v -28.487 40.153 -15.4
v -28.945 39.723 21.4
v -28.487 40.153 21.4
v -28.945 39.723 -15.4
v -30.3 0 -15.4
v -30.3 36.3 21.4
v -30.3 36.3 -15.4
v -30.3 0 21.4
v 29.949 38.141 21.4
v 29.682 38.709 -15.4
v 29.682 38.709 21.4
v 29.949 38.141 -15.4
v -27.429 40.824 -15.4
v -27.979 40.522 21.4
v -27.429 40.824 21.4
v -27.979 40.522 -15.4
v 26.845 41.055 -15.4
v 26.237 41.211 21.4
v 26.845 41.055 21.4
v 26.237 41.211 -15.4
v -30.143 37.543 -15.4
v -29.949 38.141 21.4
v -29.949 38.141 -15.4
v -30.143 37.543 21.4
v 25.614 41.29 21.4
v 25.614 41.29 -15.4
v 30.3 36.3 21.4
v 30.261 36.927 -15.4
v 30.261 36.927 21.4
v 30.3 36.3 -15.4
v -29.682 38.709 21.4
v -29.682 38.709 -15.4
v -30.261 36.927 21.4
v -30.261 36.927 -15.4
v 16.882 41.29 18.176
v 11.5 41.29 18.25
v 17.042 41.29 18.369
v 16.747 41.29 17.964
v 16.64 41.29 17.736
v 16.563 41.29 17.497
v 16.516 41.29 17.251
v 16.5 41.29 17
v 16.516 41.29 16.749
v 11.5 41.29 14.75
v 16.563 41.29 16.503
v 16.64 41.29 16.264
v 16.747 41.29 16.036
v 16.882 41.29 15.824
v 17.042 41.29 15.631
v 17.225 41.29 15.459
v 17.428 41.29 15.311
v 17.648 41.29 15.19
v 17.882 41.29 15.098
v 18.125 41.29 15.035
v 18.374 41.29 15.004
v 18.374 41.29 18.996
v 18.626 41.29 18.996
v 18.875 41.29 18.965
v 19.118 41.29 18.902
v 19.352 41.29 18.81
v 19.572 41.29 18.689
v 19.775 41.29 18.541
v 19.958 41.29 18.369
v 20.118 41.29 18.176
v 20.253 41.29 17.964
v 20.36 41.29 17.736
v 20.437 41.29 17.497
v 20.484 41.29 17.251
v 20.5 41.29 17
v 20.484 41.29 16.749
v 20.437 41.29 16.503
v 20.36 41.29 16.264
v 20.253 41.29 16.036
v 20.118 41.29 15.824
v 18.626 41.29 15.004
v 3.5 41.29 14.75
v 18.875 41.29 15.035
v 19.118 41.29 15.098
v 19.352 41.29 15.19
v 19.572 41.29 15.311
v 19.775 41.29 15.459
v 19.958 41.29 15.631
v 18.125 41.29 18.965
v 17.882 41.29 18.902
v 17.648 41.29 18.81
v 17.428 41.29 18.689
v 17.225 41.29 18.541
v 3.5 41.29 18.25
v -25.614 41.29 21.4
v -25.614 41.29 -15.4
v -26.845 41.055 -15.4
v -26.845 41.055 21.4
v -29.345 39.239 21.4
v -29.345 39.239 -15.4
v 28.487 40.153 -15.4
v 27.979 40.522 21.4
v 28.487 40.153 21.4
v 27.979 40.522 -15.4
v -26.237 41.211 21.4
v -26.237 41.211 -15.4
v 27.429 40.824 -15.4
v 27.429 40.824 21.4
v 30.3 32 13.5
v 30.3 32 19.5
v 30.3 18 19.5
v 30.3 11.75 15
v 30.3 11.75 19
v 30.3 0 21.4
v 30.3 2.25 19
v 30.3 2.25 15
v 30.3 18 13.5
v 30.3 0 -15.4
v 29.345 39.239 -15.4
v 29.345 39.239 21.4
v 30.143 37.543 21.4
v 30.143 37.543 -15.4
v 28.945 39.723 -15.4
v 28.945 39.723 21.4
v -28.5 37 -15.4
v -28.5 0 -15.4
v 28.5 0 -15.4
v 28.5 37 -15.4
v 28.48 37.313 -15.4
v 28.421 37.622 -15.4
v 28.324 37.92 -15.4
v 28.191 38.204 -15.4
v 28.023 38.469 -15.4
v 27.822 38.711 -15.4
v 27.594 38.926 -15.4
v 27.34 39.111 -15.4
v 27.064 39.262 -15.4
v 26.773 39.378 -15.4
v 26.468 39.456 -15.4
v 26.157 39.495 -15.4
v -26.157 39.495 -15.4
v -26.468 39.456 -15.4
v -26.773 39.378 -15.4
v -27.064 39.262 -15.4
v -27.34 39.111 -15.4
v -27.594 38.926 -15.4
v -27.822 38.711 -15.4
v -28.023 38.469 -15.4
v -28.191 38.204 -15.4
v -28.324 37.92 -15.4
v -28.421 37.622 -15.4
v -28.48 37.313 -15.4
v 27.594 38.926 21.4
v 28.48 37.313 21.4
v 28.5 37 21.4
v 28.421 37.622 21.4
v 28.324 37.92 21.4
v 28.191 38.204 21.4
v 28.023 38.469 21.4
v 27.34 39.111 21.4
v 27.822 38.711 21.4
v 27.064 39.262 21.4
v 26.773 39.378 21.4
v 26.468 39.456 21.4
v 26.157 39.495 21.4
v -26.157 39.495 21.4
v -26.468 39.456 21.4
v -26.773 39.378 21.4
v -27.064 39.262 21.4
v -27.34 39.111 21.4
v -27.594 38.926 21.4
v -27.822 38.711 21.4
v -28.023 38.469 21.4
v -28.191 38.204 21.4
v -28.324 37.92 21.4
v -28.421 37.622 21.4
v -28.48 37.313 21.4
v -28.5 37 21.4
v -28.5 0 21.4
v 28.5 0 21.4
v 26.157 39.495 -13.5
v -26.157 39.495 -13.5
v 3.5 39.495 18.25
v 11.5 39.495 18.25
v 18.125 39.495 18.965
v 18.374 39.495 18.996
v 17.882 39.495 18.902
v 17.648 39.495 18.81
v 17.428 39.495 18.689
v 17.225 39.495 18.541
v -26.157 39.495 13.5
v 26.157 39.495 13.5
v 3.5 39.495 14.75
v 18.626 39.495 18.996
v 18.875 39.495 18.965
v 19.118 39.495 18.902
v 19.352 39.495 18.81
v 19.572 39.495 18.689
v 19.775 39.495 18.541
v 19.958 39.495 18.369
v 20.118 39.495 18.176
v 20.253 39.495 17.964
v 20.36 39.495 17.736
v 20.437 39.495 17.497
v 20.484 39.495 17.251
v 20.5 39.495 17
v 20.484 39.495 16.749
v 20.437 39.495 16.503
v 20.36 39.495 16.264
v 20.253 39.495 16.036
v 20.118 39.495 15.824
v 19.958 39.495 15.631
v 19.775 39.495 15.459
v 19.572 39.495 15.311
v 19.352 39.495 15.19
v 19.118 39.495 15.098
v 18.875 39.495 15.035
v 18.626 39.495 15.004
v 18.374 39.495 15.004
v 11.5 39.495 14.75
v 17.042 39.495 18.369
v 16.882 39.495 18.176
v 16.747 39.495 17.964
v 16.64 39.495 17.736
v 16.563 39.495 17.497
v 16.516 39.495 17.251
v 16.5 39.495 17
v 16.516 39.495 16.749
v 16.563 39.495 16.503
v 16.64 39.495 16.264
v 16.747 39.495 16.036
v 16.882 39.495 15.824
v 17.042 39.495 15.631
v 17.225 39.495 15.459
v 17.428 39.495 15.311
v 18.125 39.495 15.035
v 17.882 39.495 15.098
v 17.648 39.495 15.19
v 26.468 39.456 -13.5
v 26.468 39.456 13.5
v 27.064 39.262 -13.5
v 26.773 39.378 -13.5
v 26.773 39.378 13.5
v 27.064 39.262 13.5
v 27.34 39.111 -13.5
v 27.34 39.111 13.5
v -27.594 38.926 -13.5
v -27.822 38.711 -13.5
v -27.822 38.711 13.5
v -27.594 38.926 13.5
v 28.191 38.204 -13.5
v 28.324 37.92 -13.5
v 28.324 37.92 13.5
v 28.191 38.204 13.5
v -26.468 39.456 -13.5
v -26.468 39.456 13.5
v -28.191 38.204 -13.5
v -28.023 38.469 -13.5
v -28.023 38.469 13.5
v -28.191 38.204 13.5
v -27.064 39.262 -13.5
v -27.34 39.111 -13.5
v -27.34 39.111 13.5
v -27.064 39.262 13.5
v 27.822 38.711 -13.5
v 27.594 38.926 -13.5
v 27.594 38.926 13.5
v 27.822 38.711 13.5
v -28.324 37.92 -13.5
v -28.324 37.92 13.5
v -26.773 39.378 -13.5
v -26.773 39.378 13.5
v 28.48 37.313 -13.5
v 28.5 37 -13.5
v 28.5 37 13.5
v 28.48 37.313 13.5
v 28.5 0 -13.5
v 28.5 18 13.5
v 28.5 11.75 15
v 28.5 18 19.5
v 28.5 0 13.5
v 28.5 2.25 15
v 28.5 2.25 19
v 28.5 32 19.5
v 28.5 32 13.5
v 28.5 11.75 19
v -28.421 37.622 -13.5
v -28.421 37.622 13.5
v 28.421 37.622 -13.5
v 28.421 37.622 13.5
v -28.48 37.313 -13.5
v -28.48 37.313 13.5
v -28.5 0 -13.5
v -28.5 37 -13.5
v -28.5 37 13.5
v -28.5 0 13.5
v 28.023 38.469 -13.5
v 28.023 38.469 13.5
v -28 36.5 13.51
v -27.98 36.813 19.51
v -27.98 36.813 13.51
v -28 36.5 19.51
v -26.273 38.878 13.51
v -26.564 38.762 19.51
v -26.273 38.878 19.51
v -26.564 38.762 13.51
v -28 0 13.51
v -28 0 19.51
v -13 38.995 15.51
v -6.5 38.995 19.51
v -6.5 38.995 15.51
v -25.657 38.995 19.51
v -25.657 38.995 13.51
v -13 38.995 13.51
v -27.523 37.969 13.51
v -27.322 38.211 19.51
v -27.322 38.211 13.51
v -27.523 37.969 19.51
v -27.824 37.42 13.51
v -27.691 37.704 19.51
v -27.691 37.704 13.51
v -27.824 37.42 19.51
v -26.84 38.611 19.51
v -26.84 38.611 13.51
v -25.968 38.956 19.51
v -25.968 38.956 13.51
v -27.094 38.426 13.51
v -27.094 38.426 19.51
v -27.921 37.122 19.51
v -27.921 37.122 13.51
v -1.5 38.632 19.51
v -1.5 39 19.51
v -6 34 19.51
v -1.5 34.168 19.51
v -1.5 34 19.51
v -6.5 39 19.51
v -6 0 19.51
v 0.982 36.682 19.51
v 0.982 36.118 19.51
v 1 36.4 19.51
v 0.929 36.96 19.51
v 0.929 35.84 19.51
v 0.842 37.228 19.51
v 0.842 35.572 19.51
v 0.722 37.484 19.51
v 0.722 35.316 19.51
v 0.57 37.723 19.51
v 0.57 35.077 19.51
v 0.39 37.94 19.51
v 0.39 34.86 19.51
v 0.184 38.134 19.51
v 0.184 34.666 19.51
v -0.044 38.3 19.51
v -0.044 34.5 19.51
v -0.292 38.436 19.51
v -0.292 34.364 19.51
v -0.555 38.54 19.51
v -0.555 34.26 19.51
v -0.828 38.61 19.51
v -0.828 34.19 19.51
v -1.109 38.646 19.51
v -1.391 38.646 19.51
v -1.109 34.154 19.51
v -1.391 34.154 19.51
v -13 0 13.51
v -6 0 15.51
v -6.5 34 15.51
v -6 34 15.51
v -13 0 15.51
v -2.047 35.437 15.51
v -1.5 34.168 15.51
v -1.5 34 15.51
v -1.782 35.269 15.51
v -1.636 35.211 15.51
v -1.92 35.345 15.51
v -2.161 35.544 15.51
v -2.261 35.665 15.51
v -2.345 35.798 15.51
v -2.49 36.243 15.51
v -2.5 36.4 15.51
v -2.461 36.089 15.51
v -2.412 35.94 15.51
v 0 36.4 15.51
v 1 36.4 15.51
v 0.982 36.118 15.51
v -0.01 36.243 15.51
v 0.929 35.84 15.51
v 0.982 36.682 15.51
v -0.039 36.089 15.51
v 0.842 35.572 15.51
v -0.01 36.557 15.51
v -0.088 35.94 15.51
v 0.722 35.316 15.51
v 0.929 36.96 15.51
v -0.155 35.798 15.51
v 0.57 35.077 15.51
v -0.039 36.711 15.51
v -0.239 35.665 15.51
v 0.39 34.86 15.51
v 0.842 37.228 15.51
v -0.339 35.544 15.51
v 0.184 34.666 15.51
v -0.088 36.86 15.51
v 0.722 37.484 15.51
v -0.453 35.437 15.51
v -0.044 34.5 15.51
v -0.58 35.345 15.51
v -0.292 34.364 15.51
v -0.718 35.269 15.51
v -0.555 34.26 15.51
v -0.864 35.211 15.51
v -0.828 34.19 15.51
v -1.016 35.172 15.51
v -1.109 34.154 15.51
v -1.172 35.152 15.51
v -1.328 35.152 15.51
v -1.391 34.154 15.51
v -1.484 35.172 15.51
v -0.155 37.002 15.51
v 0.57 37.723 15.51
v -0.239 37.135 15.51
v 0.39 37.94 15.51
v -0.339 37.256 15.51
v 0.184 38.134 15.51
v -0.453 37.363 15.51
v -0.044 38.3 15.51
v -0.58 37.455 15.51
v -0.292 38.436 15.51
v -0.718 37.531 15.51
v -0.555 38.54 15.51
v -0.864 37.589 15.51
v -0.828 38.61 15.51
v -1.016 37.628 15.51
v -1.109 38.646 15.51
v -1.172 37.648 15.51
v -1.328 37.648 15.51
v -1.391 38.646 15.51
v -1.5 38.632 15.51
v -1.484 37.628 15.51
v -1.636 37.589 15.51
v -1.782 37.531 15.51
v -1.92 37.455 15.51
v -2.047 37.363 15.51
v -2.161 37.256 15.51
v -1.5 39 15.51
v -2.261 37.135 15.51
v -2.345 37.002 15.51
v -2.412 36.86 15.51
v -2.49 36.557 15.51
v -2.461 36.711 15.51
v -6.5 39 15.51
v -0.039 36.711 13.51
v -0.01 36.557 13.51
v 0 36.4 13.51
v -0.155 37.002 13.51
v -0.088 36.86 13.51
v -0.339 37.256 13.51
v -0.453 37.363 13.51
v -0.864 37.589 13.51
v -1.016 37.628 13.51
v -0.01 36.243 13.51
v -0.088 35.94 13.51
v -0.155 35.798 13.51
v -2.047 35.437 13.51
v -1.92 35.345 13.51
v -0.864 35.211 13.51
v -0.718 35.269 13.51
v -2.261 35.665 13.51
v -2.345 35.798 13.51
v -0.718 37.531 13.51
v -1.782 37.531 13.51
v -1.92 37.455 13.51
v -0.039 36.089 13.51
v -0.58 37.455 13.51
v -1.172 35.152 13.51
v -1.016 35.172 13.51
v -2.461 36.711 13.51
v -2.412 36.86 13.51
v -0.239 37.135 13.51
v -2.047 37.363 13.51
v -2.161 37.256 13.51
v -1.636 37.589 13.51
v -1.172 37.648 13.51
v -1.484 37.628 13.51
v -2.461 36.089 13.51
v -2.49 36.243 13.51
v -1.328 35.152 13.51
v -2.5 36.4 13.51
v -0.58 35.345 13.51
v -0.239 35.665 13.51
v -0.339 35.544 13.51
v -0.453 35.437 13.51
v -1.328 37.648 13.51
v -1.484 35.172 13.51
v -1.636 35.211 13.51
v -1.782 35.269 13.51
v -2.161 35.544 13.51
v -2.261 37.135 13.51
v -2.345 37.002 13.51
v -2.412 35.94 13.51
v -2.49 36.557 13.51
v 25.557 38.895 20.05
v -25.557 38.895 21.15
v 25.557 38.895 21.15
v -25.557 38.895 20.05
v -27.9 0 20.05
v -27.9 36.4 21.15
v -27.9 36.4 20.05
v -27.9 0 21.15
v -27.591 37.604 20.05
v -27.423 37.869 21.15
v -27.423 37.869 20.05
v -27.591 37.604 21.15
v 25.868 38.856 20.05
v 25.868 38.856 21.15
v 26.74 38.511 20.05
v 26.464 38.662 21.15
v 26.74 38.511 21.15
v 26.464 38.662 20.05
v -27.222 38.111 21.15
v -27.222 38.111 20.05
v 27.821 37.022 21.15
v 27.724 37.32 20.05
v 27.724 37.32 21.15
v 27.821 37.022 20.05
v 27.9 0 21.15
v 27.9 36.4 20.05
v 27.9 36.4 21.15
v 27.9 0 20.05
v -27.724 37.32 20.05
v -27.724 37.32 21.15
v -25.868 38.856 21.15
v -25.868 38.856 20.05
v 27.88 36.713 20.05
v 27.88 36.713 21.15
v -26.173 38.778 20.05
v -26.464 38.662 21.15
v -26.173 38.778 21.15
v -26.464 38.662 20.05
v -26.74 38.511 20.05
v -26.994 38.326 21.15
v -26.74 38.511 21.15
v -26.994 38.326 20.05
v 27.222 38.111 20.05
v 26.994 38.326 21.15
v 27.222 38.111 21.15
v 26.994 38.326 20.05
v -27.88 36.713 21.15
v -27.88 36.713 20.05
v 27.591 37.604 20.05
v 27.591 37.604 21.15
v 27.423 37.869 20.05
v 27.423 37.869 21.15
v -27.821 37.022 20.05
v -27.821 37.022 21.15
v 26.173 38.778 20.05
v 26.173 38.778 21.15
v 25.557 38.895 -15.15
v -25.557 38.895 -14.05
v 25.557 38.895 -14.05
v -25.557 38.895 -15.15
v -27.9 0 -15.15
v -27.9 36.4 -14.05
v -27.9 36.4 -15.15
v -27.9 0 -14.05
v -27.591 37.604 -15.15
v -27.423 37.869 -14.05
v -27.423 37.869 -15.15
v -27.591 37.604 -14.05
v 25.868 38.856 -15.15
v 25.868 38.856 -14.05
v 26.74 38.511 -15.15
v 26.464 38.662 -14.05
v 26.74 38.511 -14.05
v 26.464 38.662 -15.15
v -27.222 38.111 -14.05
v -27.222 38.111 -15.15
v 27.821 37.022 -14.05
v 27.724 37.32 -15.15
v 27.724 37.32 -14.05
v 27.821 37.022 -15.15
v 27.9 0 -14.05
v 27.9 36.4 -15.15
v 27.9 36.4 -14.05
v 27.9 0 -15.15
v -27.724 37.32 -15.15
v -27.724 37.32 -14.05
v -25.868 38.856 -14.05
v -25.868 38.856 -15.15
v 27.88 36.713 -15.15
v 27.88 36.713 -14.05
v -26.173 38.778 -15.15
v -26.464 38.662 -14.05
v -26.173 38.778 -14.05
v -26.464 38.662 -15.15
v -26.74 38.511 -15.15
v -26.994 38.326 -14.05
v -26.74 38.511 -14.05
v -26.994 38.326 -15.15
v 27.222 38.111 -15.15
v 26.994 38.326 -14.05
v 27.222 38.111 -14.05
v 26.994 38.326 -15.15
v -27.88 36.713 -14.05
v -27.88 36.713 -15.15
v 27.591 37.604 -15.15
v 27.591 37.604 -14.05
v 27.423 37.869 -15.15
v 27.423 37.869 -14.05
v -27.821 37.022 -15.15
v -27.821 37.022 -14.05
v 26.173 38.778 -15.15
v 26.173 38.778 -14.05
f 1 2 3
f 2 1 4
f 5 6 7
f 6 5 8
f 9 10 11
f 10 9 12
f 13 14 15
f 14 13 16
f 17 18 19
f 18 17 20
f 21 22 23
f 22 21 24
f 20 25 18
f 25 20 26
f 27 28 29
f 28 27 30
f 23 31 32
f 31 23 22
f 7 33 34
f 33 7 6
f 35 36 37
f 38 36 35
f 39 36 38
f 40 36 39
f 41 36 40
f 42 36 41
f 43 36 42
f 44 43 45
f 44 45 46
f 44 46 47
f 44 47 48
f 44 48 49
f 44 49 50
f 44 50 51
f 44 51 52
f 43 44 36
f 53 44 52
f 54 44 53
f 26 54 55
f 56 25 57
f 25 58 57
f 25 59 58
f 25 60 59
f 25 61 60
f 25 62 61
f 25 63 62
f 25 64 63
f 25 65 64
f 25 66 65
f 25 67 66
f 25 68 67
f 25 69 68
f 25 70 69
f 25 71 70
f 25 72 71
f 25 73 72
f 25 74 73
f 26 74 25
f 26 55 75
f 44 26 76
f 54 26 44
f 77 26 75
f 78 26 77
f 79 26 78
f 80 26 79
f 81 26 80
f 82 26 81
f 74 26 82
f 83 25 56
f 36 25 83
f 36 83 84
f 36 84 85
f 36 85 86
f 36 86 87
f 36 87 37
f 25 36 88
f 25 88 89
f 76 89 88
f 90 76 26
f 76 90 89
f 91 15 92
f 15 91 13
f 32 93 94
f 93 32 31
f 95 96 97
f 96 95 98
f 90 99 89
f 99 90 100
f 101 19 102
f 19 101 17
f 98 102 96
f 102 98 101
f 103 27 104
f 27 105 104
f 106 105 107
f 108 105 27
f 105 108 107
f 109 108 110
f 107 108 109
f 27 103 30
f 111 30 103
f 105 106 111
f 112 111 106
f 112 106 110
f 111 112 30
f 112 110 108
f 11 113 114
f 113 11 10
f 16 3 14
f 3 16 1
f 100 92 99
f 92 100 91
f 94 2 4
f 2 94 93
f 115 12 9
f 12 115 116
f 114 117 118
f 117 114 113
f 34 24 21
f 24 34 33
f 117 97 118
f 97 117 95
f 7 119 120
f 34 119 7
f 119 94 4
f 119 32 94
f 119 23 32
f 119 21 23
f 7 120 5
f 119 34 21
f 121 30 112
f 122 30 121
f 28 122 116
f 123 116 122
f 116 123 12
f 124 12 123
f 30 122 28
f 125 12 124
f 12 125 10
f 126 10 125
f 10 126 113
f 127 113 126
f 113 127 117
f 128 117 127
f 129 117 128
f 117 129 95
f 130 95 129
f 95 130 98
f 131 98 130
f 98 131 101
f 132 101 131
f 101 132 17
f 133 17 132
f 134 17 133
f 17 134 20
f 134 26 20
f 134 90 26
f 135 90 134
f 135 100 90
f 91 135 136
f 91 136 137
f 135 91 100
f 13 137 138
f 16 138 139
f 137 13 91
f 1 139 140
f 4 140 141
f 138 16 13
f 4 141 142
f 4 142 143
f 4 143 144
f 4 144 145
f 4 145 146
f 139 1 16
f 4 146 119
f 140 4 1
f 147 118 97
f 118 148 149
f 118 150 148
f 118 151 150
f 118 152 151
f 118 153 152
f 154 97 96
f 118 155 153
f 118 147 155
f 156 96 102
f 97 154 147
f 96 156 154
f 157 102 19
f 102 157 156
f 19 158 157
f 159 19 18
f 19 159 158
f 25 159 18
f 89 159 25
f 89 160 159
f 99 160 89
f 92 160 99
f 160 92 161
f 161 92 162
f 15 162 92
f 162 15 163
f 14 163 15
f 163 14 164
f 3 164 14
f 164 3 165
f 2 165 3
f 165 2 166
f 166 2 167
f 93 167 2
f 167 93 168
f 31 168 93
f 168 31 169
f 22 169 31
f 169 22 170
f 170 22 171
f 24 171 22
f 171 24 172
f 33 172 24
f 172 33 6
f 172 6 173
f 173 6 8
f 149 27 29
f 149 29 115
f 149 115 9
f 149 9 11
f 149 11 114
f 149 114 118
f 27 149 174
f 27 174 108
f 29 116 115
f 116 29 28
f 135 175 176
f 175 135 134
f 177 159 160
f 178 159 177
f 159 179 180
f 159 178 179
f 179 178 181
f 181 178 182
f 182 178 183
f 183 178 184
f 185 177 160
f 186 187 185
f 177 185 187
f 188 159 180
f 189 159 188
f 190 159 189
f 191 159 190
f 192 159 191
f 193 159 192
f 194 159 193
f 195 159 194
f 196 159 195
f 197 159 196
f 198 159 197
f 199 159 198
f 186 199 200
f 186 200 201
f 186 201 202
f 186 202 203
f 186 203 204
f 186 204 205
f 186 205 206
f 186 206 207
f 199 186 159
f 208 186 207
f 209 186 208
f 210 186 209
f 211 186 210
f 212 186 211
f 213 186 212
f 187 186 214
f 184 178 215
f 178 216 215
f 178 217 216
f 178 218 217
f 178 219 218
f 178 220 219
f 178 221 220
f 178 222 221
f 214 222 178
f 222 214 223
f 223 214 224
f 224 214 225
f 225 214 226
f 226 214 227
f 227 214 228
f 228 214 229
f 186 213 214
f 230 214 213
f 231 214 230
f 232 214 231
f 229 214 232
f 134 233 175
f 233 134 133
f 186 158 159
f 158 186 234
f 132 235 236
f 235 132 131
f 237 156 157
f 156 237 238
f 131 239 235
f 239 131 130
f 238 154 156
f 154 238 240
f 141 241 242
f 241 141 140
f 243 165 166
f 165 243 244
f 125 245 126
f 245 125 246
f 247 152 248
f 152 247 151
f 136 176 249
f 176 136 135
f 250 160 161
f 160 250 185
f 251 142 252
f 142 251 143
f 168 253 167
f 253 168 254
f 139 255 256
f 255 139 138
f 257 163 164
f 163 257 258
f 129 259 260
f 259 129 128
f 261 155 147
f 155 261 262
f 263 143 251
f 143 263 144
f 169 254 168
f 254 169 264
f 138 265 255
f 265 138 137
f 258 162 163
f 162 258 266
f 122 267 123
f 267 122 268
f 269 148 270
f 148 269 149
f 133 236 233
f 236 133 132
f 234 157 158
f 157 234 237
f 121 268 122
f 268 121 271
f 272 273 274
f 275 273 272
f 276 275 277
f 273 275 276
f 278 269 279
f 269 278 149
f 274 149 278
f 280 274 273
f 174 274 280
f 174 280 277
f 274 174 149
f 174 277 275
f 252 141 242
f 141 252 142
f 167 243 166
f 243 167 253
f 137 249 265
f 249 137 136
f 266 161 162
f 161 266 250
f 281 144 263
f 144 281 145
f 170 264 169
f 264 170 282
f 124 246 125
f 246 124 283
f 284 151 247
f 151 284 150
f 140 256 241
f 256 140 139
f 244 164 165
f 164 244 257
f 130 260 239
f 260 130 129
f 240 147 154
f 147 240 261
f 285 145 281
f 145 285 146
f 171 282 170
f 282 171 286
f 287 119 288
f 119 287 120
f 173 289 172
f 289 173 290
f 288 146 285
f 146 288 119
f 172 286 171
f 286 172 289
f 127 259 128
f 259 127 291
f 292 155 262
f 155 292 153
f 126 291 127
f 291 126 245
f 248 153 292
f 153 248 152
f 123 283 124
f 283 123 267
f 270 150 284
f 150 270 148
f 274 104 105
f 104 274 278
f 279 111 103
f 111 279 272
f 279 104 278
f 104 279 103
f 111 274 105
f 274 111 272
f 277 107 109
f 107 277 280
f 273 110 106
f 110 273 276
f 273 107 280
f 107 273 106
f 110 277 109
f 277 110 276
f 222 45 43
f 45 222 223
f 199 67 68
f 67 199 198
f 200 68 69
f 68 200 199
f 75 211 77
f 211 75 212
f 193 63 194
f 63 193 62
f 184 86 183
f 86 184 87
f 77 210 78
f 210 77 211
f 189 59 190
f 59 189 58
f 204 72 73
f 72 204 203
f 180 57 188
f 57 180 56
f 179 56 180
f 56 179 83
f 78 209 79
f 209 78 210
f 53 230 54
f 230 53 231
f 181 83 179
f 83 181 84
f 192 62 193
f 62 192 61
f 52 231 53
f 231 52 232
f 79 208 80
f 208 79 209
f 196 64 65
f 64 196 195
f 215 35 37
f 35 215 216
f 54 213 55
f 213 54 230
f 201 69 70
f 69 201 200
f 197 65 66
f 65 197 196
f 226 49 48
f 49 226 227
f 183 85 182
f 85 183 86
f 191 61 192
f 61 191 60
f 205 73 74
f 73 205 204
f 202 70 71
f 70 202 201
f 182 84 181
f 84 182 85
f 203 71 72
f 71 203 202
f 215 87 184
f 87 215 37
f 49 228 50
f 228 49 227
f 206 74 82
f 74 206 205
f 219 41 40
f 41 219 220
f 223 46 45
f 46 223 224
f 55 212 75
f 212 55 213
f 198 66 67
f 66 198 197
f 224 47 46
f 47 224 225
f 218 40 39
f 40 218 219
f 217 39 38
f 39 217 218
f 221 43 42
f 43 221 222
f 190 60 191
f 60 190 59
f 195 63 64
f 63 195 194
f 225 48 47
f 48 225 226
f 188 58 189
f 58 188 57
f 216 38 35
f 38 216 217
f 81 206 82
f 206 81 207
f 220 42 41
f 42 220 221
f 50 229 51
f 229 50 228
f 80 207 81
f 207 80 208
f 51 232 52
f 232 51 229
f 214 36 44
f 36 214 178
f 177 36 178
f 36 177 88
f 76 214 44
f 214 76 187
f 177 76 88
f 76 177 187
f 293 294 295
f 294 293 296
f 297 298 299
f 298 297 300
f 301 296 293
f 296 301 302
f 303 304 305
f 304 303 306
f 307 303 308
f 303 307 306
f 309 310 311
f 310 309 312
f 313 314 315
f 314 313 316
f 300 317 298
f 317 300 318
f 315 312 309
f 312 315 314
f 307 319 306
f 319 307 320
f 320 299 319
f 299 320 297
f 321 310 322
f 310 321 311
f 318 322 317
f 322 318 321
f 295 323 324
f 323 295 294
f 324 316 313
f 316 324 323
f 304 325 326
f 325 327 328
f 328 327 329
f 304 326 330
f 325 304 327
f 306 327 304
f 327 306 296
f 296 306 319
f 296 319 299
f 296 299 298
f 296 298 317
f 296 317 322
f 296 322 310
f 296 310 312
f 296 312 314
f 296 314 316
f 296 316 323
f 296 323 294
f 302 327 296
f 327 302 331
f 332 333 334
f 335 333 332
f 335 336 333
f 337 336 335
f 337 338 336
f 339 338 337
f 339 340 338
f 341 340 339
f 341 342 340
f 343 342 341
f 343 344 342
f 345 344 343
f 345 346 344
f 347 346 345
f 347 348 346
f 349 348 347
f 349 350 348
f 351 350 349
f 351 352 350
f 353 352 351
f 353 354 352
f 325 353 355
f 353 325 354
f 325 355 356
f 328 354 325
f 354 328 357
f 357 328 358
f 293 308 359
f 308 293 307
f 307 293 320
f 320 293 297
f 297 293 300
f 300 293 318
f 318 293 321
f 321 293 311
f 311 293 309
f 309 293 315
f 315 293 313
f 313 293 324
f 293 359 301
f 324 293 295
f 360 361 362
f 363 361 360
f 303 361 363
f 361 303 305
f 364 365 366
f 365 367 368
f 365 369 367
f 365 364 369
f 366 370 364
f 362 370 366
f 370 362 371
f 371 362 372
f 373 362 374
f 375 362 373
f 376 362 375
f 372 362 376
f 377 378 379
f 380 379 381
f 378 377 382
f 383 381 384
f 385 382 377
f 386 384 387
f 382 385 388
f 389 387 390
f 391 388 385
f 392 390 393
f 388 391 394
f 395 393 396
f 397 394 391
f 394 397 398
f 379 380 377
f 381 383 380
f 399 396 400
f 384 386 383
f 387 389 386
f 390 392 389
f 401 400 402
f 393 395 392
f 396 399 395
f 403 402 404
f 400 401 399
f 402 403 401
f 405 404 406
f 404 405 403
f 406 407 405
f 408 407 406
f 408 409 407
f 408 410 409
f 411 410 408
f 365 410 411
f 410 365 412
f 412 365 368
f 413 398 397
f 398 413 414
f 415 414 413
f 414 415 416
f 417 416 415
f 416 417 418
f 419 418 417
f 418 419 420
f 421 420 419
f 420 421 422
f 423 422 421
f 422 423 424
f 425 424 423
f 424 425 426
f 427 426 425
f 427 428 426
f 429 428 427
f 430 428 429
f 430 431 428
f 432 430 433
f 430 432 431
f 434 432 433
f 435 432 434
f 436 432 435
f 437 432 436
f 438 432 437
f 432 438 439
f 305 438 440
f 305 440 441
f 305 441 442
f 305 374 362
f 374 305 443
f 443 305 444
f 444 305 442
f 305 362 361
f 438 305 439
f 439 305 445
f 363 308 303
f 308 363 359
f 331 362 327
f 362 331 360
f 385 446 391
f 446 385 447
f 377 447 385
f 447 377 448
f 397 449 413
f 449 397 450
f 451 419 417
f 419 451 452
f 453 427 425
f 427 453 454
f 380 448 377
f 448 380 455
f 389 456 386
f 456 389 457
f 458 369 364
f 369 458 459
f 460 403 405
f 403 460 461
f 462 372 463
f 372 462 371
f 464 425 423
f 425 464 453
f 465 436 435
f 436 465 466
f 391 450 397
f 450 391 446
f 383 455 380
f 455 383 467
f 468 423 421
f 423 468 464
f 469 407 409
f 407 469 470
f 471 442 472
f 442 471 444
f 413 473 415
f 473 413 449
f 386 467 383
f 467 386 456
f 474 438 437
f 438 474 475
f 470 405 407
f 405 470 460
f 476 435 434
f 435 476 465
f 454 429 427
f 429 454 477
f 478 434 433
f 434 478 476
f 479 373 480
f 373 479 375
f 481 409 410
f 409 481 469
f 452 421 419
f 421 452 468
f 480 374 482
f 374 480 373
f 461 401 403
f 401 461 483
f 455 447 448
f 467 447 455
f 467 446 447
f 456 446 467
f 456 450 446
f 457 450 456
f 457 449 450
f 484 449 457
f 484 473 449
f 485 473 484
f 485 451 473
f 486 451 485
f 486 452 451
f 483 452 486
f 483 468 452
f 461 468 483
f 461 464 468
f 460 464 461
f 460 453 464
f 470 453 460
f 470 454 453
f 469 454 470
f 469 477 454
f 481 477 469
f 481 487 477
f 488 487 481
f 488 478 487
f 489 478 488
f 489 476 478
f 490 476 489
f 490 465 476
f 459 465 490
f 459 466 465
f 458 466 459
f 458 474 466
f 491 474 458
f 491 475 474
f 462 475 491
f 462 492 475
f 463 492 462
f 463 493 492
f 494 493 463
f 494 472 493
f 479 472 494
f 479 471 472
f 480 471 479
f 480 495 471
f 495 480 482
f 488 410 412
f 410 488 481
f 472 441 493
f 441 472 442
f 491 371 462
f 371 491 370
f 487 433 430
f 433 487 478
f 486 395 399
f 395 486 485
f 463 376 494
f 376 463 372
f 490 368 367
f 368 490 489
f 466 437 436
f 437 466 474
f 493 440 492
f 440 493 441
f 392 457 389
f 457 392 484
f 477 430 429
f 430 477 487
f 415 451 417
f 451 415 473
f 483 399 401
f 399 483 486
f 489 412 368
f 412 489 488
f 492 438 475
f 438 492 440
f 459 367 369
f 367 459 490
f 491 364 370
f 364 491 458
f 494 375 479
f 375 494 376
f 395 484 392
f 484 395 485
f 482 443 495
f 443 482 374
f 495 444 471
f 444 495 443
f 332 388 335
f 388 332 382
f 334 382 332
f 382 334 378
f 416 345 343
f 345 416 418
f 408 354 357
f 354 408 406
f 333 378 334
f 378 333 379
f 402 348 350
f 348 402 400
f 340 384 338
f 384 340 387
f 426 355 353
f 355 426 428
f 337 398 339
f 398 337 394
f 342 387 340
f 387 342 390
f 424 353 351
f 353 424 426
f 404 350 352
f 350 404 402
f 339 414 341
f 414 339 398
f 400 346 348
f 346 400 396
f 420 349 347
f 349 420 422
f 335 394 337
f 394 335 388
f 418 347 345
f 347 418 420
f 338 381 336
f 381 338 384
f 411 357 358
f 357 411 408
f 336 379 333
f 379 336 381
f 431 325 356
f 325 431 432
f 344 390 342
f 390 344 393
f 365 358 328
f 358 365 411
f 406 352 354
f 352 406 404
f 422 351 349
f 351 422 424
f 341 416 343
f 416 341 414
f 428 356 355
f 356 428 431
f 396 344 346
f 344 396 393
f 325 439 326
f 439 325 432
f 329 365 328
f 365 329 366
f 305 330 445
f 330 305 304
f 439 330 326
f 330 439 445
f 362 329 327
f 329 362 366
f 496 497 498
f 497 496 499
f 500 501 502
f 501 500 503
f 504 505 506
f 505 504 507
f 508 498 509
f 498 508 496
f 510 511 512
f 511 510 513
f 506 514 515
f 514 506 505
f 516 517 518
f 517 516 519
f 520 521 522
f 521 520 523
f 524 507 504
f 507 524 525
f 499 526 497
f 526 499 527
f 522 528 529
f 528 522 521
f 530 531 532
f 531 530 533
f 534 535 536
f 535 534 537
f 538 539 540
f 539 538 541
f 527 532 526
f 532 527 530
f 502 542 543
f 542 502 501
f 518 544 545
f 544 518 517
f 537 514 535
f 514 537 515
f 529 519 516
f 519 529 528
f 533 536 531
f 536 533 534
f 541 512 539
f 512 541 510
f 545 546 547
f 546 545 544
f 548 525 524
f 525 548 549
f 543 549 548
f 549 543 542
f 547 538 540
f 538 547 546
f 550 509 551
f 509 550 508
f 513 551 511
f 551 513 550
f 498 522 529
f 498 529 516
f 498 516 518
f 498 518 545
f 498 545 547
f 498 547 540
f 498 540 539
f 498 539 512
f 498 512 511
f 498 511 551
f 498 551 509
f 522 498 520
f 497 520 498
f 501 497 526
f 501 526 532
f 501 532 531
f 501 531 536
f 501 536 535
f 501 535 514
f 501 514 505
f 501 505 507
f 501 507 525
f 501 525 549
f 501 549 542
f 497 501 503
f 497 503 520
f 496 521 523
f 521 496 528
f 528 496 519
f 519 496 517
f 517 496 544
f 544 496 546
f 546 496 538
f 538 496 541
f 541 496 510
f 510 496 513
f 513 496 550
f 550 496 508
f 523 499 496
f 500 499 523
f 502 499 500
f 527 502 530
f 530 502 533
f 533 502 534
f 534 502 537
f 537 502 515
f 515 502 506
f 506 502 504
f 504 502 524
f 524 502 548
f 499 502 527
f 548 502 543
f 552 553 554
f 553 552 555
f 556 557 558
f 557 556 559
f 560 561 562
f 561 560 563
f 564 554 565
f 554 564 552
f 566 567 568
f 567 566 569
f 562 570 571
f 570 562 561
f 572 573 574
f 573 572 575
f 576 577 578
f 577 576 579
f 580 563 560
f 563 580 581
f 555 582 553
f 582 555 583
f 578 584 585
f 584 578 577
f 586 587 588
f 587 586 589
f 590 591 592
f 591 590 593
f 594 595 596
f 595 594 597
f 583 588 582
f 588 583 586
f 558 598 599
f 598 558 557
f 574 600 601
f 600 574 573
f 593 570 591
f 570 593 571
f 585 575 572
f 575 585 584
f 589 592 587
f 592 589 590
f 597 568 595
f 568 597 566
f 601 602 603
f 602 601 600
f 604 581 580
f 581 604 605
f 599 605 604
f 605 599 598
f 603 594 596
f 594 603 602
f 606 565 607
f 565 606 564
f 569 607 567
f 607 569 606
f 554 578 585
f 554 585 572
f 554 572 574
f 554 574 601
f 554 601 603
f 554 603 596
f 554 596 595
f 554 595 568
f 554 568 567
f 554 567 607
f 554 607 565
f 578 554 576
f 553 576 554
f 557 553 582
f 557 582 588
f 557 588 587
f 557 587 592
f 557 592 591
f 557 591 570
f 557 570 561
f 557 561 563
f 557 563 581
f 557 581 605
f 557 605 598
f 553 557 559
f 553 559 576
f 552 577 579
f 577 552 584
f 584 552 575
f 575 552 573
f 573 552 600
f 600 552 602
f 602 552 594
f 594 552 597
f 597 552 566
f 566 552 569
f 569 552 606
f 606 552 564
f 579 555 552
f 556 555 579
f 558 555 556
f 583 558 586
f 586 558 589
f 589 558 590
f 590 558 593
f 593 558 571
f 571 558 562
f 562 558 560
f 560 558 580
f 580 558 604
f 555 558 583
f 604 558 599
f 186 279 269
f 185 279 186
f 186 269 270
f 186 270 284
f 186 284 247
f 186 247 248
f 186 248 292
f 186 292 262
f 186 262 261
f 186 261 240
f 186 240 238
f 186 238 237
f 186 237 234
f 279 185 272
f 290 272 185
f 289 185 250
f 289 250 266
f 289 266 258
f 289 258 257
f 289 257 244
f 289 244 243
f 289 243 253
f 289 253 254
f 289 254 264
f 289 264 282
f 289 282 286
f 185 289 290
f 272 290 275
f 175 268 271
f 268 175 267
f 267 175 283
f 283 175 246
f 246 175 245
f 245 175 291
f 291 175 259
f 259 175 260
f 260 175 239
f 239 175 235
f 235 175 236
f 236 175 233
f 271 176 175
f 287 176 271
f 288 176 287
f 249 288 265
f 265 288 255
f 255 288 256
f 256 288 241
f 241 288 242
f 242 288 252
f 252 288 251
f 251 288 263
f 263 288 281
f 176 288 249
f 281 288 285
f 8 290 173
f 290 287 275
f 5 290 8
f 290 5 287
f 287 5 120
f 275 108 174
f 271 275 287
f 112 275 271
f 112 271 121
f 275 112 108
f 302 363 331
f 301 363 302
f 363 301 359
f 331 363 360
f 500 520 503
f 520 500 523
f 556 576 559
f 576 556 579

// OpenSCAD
// file: ../roundedcube.scad
// Higher definition curves
$fs = 0.01;

module roundedcube(size = [1, 1, 1], center = false, radius = 0.5, apply_to = "all") {
	// If single value, convert to [x, y, z] vector
	size = (size[0] == undef) ? [size, size, size] : size;

	translate_min = radius;
	translate_xmax = size[0] - radius;
	translate_ymax = size[1] - radius;
	translate_zmax = size[2] - radius;

	diameter = radius * 2;

	module build_point(type = "sphere", rotate = [0, 0, 0]) {
		if (type == "sphere") {
			sphere(r = radius);
		} else if (type == "cylinder") {
			rotate(a = rotate)
			cylinder(h = diameter, r = radius, center = true);
		}
	}

	obj_translate = (center == false) ?
		[0, 0, 0] : [
			-(size[0] / 2),
			-(size[1] / 2),
			-(size[2] / 2)
		];

	translate(v = obj_translate) {
		hull() {
			for (translate_x = [translate_min, translate_xmax]) {
				x_at = (translate_x == translate_min) ? "min" : "max";
				for (translate_y = [translate_min, translate_ymax]) {
					y_at = (translate_y == translate_min) ? "min" : "max";
					for (translate_z = [translate_min, translate_zmax]) {
						z_at = (translate_z == translate_min) ? "min" : "max";

						translate(v = [translate_x, translate_y, translate_z])
						if (
							(apply_to == "all") ||
							(apply_to == "xmin" && x_at == "min") || (apply_to == "xmax" && x_at == "max") ||
							(apply_to == "ymin" && y_at == "min") || (apply_to == "ymax" && y_at == "max") ||
							(apply_to == "zmin" && z_at == "min") || (apply_to == "zmax" && z_at == "max")
						) {
							build_point("sphere");
						} else {
							rotate =
								(apply_to == "xmin" || apply_to == "xmax" || apply_to == "x") ? [0, 90, 0] : (
								(apply_to == "ymin" || apply_to == "ymax" || apply_to == "y") ? [90, 90, 0] :
								[0, 0, 0]
							);
							build_point("cylinder", rotate);
						}
					}
				}
			}
		}
	}
}

module roundedcubez(size = [1, 1, 1], center = false, radius = 0.5, apply_to = "all") {
	intersection() {
		roundedcube(size, center, radius, apply_to="z");
		scale([1.0, 1.0, 1.1])
			cube(size, center);
	}
}

// The good stuff!!!!  Forget about the whack stuff above.
// centered on XY only
module cube_(size=[1, 1, 1])
	translate([-size[0] / 2, -size[1] / 2, 0])
		cube(size);

// centered on XY only
module roundedcubez_(size = [1, 1, 1], radius = 0.5) {
	linear_extrude(height=size[2]) {
		square([size[0] - 2 * radius, size[1]], center=true);
		square([size[0], size[1] - 2 * radius], center=true);
		for (i=[-1, 1])
			for (j=[-1, 1])
				translate([i * (size[0] / 2 - radius), j * (size[1] / 2 - radius), 0])
					circle(r = radius);
	}
}
// main file
$fn=50;

include <../roundedcube.scad>


r_corner = 5;

w_batt = 57;
h_batt = 79;
t_batt = 27;

// Make it a multiple of nozzle size
t_wall = 1.8;

// thickness of the PCB holder
pcb_t = 6;

h_pcb = 65;
w_pcb = 33;
pcb_x = w_batt / 2 - w_pcb / 2;
pcb_y = h_batt / 2 - h_pcb / 2;
pcb_z = pcb_t / 2 + t_batt / 2 + 0.01;


// thickness of the top and bottom denim-lined plates
h_plates = 1;
t_denim = 0.6;
plate_z = t_batt / 2 + h_plates / 2 + pcb_t + t_denim;


module corners(w=10, h=5) {
    for (i = [-1, 1])
        for (j = [-1, 1])
            translate([w / 2 * i, h / 2 * j, 0]) children(0);
}


module batt() {
    // color("green") {
    //     translate([12.0, 4, t_batt / 2 + 3])
    //         cube(size=[32.5, 65, 6], center=true);
    // }
    color("grey")
        cube(size=[w_batt, h_batt, t_batt], center=true);
}


module box() {
    h_box = t_batt + pcb_t + 2 * h_plates + 3 * t_denim;
    translate([0, 0, pcb_t / 2])
        difference() {
            // outer dimensions of box
            roundedcubez(
                size=[w_batt + 2 * t_wall, h_batt + 2 * t_wall, h_box],
                center=true,
                radius=r_corner
            );
            // inner dimensions of box
            roundedcubez(
                size=[w_batt, h_batt, h_box + 1],
                center=true,
                radius=r_corner / 2
            );
            // bottom notch for lid
            // translate([0, 0, (t_wall - h_box - 0.01) / 2])
            //     cube(size=[w_batt + t_wall, h_batt + t_wall, t_wall], center=true);
            // USB holes
            translate([w_batt / 2, pcb_y, 13.5])
                usb_holes();

        }
}

module usb_holes() {
    // cut 2 big USB holes
    for (i = [-1, 1])
        translate([0, i * 18, 0])
            cube(size=[10, 14, 6], center=true);

    // cut middle USB hole
    translate([0, 0, 0.5])
        cube(size=[10, 9.5, 4], center=true);

    // button hole
    translate([-10, w_batt / 2 + 6, 0.5])
        rotate([90, 0, 0])
            cylinder(h=15, d=4, center=true);

    // side USB hole
    translate([-21, w_batt / 2 + 6, 0])
        cube([8, 15, 3.5], center=true);

    // LED holes
    translate([-16, -30, 10])
        cube(size=[15, 3, 20], center=true);
}


module pcb_holder(){
    difference() {
        roundedcubez(
            size=[w_batt - 1, h_batt - 1, pcb_t],
            center=true,
            radius=r_corner / 2
        );

        // cavity for PCB
        translate([pcb_x, pcb_y, 0])
            cube(size=[w_pcb, h_pcb, 10], center=true);

        // wire channels
        translate([pcb_x - 5 - 15, pcb_y, -3 - pcb_t / 2])
            cube(size=[10, 100, 10], center=true);

        translate([pcb_x - 16.5, pcb_y, 0])
            cube(size=[3, 58, 10], center=true);
    }

    // pins + spacer
    difference() {
        translate([pcb_x, pcb_y, 0]) {
            corners(26.5, 58.8)
                union() {
                    cylinder(d=2.5, h=pcb_t, center=true);
                    translate([0, 0, 1])
                        cylinder(d=4.5, h=pcb_t - 2, center=true);
                }
            // cubes to connect pins to frame
            translate([-1.5, -0.5, 1])
                corners(29, 60)
                    cube(size=[5, 5.0, pcb_t - 2], center=true);
        }
        // remove un-useful corner
        translate([27, 25, 0])
            cube([50, 50, 10], center=true);
    }
}

module denim_plate() {
    difference() {
        roundedcubez(
            size=[w_batt - 2 * t_denim, h_batt - 2 * t_denim, h_plates],
            center=true,
            radius=r_corner / 2
        );
        translate([pcb_x, pcb_y, -10])
            usb_holes();
    }
}


module main() {
    batt();
    box();

    color("blue")
        translate([0, 0, pcb_z])
            pcb_holder();

    color("orange")
        for (z = [plate_z, -plate_z + pcb_t])
            translate([0, 0, z])
                denim_plate();
}


intersection() {
    main();
    translate([0, 100, 0])
        cube([200, 200, 200], center=true);
}
